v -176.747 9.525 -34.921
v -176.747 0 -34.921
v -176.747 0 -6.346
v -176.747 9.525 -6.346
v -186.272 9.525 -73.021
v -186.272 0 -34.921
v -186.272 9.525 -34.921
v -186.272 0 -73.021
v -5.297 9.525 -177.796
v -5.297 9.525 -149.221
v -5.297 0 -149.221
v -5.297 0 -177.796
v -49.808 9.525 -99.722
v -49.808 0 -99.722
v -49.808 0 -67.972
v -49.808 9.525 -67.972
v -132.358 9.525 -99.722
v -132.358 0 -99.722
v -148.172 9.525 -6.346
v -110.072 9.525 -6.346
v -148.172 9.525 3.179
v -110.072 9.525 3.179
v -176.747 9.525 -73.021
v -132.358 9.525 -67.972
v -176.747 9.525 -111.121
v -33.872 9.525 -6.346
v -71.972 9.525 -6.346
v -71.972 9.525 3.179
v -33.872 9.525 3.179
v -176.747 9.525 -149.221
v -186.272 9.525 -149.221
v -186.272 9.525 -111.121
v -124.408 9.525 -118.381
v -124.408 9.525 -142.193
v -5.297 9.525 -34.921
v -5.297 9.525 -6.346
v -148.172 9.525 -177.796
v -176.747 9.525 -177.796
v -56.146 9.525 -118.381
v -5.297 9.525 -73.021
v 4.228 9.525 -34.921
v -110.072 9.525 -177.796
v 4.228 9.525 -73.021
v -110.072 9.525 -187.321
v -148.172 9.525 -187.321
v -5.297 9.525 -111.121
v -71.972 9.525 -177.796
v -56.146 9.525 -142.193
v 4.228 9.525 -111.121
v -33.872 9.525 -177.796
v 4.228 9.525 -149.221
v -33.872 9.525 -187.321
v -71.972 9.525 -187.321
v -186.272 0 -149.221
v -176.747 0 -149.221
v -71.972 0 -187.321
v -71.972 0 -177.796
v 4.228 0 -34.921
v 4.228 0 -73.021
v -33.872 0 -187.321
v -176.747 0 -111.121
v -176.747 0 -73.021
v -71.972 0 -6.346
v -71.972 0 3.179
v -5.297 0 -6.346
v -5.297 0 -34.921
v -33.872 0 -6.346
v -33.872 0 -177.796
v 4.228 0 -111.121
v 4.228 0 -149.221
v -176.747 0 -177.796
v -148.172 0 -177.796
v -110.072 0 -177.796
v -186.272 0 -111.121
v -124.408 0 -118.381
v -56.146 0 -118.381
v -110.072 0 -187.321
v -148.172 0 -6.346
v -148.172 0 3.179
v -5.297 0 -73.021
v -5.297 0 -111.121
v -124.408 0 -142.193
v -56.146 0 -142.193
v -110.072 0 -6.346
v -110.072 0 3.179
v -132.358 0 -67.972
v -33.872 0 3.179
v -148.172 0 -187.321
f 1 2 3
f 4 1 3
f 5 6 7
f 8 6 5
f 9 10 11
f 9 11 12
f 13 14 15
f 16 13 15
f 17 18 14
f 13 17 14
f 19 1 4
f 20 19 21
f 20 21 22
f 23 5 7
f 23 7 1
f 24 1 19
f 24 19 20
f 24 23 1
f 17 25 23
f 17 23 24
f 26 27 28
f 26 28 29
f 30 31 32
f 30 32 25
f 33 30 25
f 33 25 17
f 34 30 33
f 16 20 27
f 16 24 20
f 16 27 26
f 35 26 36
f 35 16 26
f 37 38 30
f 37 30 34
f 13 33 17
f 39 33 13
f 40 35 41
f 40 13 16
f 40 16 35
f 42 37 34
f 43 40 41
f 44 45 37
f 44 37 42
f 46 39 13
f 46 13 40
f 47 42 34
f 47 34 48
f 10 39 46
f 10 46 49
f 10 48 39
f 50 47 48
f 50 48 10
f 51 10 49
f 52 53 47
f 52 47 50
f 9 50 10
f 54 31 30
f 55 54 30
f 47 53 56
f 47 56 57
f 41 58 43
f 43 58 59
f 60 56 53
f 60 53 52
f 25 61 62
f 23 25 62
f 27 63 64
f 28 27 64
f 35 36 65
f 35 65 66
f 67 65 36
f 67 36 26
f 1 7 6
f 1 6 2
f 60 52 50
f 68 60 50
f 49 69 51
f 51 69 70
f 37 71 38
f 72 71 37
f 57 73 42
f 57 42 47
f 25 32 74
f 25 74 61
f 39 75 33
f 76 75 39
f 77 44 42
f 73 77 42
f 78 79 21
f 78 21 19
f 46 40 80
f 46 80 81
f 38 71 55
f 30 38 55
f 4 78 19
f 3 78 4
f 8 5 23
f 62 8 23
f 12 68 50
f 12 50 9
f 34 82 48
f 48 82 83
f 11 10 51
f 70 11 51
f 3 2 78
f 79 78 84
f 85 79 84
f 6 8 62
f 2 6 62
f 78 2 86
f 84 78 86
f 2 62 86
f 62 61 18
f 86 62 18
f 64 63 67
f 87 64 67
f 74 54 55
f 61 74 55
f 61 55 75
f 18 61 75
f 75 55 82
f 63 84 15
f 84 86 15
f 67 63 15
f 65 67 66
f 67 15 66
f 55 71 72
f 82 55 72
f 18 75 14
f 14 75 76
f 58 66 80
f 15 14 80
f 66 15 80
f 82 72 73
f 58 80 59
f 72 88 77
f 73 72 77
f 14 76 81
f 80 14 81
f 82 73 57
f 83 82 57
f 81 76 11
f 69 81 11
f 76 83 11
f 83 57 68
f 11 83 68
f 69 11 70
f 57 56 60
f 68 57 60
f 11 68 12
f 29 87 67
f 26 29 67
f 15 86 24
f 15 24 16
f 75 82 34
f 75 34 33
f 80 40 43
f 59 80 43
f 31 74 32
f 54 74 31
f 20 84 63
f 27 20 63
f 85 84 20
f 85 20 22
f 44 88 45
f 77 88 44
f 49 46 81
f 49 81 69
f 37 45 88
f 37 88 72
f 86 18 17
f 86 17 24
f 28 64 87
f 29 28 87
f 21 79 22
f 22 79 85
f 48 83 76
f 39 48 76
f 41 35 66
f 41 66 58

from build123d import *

# Parameters (mm, degrees)
SKETCH1_W           = 190.5
SKETCH1_H           = 190.5
BOSS_EXTRUDE1_DEPTH = 9.525
SKETCH2_W           = 9.525
SKETCH2_H           = 38.1
CUT_EXTRUDE1_DEPTH  = 9.525
SKETCH3_W           = 9.525
SKETCH3_H           = 38.1
CUT_EXTRUDE2_DEPTH  = 9.525
SKETCH4_W           = 9.525
SKETCH4_H           = 38.1
CUT_EXTRUDE3_DEPTH  = 9.525
SKETCH5_W           = 9.525
SKETCH5_H           = 38.1
CUT_EXTRUDE4_DEPTH  = 9.525
SKETCH6_W           = 9.525
SKETCH6_H           = 38.1
CUT_EXTRUDE5_DEPTH  = 9.525
SKETCH7_W           = 9.525
SKETCH7_H           = 38.1
CUT_EXTRUDE6_DEPTH  = 9.525
SKETCH8_W           = 28.575
SKETCH8_H           = 9.525
CUT_EXTRUDE7_DEPTH  = 9.525
SKETCH9_W           = 38.1
SKETCH9_H           = 9.525
CUT_EXTRUDE8_DEPTH  = 9.525
SKETCH10_W          = 28.575
SKETCH10_H          = 9.525
CUT_EXTRUDE9_DEPTH  = 9.525
SKETCH11_W          = 28.575
SKETCH11_H          = 9.525
CUT_EXTRUDE11_DEPTH = 9.525
SKETCH12_W          = 38.1
SKETCH12_H          = 9.525
CUT_EXTRUDE12_DEPTH = 9.525
SKETCH14_W          = 28.575
SKETCH14_H          = 9.525
CUT_EXTRUDE13_DEPTH = 9.525
SKETCH15_W          = 68.2625
SKETCH15_H          = 23.8125
CUT_EXTRUDE14_DEPTH = 9.525
SKETCH16_W          = 82.55
SKETCH16_H          = 31.75
CUT_EXTRUDE15_DEPTH = 9.525


with BuildPart() as part:
    # Sketch1 → Boss-Extrude1 (new body)
    with BuildSketch(Plane(origin=(0, 0, 0), x_dir=(1, 0, 0), z_dir=(0, 1, 0))):
        with Locations((-91.022160665, 92.07132964)):
            Rectangle(SKETCH1_W, SKETCH1_H)
    extrude(amount=BOSS_EXTRUDE1_DEPTH)

    # Sketch2 → Cut-Extrude1 (cut)
    with BuildSketch(Plane(origin=(0, 9.525, 0), x_dir=(1, 0, 0), z_dir=(0, 1, 0))):
        with Locations((-0.534660665, 15.87132964)):
            Rectangle(SKETCH2_W, SKETCH2_H)
    extrude(amount=-CUT_EXTRUDE1_DEPTH, mode=Mode.SUBTRACT)

    # Sketch3 → Cut-Extrude2 (cut)
    with BuildSketch(Plane(origin=(0, 9.525, 0), x_dir=(1, 0, 0), z_dir=(0, 1, 0))):
        with Locations((-0.534660665, 92.07132964)):
            Rectangle(SKETCH3_W, SKETCH3_H)
    extrude(amount=-CUT_EXTRUDE2_DEPTH, mode=Mode.SUBTRACT)

    # Sketch4 → Cut-Extrude3 (cut)
    with BuildSketch(Plane(origin=(0, 9.525, 0), x_dir=(1, 0, 0), z_dir=(0, 1, 0))):
        with Locations((-0.534660665, 168.27132964)):
            Rectangle(SKETCH4_W, SKETCH4_H)
    extrude(amount=-CUT_EXTRUDE3_DEPTH, mode=Mode.SUBTRACT)

    # Sketch5 → Cut-Extrude4 (cut)
    with BuildSketch(Plane.XZ):
        with Locations((-181.509660665, -15.87132964)):
            Rectangle(SKETCH5_W, SKETCH5_H)
    extrude(amount=-CUT_EXTRUDE4_DEPTH, mode=Mode.SUBTRACT)

    # Sketch6 → Cut-Extrude5 (cut)
    with BuildSketch(Plane.XZ):
        with Locations((-181.509660665, -92.07132964)):
            Rectangle(SKETCH6_W, SKETCH6_H)
    extrude(amount=-CUT_EXTRUDE5_DEPTH, mode=Mode.SUBTRACT)

    # Sketch7 → Cut-Extrude6 (cut)
    with BuildSketch(Plane.XZ):
        with Locations((-181.509660665, -168.27132964)):
            Rectangle(SKETCH7_W, SKETCH7_H)
    extrude(amount=-CUT_EXTRUDE6_DEPTH, mode=Mode.SUBTRACT)

    # Sketch8 → Cut-Extrude7 (cut)
    with BuildSketch(Plane.XZ):
        with Locations((-19.584660665, -182.55882964)):
            Rectangle(SKETCH8_W, SKETCH8_H)
    extrude(amount=-CUT_EXTRUDE7_DEPTH, mode=Mode.SUBTRACT)

    # Sketch9 → Cut-Extrude8 (cut)
    with BuildSketch(Plane.XZ):
        with Locations((-91.022160665, -182.55882964)):
            Rectangle(SKETCH9_W, SKETCH9_H)
    extrude(amount=-CUT_EXTRUDE8_DEPTH, mode=Mode.SUBTRACT)

    # Sketch10 → Cut-Extrude9 (cut)
    with BuildSketch(Plane.XZ):
        with Locations((-162.459660665, -182.55882964)):
            Rectangle(SKETCH10_W, SKETCH10_H)
    extrude(amount=-CUT_EXTRUDE9_DEPTH, mode=Mode.SUBTRACT)

    # Sketch11 → Cut-Extrude11 (cut)
    with BuildSketch(Plane(origin=(0, 0, 0), x_dir=(-1, 0, 0), z_dir=(0, -1, 0))):
        with Locations((162.459660665, 1.58382964)):
            Rectangle(SKETCH11_W, SKETCH11_H)
    extrude(amount=-CUT_EXTRUDE11_DEPTH, mode=Mode.SUBTRACT)

    # Sketch12 → Cut-Extrude12 (cut)
    with BuildSketch(Plane.XZ):
        with Locations((-91.022160665, -1.58382964)):
            Rectangle(SKETCH12_W, SKETCH12_H)
    extrude(amount=-CUT_EXTRUDE12_DEPTH, mode=Mode.SUBTRACT)

    # Sketch14 → Cut-Extrude13 (cut)
    with BuildSketch(Plane(origin=(0, 0, 0), x_dir=(-1, 0, 0), z_dir=(0, -1, 0))):
        with Locations((19.584660665, 1.58382964)):
            Rectangle(SKETCH14_W, SKETCH14_H)
    extrude(amount=-CUT_EXTRUDE13_DEPTH, mode=Mode.SUBTRACT)

    # Sketch15 → Cut-Extrude14 (cut)
    with BuildSketch(Plane.XZ):
        with Locations((-90.276924716, -130.287204322)):
            Rectangle(SKETCH15_W, SKETCH15_H)
    extrude(amount=-CUT_EXTRUDE14_DEPTH, mode=Mode.SUBTRACT)

    # Sketch16 → Cut-Extrude15 (cut)
    with BuildSketch(Plane.XZ):
        with Locations((-91.083368355, -83.846953715)):
            Rectangle(SKETCH16_W, SKETCH16_H)
    extrude(amount=-CUT_EXTRUDE15_DEPTH, mode=Mode.SUBTRACT)


solid = part.part
